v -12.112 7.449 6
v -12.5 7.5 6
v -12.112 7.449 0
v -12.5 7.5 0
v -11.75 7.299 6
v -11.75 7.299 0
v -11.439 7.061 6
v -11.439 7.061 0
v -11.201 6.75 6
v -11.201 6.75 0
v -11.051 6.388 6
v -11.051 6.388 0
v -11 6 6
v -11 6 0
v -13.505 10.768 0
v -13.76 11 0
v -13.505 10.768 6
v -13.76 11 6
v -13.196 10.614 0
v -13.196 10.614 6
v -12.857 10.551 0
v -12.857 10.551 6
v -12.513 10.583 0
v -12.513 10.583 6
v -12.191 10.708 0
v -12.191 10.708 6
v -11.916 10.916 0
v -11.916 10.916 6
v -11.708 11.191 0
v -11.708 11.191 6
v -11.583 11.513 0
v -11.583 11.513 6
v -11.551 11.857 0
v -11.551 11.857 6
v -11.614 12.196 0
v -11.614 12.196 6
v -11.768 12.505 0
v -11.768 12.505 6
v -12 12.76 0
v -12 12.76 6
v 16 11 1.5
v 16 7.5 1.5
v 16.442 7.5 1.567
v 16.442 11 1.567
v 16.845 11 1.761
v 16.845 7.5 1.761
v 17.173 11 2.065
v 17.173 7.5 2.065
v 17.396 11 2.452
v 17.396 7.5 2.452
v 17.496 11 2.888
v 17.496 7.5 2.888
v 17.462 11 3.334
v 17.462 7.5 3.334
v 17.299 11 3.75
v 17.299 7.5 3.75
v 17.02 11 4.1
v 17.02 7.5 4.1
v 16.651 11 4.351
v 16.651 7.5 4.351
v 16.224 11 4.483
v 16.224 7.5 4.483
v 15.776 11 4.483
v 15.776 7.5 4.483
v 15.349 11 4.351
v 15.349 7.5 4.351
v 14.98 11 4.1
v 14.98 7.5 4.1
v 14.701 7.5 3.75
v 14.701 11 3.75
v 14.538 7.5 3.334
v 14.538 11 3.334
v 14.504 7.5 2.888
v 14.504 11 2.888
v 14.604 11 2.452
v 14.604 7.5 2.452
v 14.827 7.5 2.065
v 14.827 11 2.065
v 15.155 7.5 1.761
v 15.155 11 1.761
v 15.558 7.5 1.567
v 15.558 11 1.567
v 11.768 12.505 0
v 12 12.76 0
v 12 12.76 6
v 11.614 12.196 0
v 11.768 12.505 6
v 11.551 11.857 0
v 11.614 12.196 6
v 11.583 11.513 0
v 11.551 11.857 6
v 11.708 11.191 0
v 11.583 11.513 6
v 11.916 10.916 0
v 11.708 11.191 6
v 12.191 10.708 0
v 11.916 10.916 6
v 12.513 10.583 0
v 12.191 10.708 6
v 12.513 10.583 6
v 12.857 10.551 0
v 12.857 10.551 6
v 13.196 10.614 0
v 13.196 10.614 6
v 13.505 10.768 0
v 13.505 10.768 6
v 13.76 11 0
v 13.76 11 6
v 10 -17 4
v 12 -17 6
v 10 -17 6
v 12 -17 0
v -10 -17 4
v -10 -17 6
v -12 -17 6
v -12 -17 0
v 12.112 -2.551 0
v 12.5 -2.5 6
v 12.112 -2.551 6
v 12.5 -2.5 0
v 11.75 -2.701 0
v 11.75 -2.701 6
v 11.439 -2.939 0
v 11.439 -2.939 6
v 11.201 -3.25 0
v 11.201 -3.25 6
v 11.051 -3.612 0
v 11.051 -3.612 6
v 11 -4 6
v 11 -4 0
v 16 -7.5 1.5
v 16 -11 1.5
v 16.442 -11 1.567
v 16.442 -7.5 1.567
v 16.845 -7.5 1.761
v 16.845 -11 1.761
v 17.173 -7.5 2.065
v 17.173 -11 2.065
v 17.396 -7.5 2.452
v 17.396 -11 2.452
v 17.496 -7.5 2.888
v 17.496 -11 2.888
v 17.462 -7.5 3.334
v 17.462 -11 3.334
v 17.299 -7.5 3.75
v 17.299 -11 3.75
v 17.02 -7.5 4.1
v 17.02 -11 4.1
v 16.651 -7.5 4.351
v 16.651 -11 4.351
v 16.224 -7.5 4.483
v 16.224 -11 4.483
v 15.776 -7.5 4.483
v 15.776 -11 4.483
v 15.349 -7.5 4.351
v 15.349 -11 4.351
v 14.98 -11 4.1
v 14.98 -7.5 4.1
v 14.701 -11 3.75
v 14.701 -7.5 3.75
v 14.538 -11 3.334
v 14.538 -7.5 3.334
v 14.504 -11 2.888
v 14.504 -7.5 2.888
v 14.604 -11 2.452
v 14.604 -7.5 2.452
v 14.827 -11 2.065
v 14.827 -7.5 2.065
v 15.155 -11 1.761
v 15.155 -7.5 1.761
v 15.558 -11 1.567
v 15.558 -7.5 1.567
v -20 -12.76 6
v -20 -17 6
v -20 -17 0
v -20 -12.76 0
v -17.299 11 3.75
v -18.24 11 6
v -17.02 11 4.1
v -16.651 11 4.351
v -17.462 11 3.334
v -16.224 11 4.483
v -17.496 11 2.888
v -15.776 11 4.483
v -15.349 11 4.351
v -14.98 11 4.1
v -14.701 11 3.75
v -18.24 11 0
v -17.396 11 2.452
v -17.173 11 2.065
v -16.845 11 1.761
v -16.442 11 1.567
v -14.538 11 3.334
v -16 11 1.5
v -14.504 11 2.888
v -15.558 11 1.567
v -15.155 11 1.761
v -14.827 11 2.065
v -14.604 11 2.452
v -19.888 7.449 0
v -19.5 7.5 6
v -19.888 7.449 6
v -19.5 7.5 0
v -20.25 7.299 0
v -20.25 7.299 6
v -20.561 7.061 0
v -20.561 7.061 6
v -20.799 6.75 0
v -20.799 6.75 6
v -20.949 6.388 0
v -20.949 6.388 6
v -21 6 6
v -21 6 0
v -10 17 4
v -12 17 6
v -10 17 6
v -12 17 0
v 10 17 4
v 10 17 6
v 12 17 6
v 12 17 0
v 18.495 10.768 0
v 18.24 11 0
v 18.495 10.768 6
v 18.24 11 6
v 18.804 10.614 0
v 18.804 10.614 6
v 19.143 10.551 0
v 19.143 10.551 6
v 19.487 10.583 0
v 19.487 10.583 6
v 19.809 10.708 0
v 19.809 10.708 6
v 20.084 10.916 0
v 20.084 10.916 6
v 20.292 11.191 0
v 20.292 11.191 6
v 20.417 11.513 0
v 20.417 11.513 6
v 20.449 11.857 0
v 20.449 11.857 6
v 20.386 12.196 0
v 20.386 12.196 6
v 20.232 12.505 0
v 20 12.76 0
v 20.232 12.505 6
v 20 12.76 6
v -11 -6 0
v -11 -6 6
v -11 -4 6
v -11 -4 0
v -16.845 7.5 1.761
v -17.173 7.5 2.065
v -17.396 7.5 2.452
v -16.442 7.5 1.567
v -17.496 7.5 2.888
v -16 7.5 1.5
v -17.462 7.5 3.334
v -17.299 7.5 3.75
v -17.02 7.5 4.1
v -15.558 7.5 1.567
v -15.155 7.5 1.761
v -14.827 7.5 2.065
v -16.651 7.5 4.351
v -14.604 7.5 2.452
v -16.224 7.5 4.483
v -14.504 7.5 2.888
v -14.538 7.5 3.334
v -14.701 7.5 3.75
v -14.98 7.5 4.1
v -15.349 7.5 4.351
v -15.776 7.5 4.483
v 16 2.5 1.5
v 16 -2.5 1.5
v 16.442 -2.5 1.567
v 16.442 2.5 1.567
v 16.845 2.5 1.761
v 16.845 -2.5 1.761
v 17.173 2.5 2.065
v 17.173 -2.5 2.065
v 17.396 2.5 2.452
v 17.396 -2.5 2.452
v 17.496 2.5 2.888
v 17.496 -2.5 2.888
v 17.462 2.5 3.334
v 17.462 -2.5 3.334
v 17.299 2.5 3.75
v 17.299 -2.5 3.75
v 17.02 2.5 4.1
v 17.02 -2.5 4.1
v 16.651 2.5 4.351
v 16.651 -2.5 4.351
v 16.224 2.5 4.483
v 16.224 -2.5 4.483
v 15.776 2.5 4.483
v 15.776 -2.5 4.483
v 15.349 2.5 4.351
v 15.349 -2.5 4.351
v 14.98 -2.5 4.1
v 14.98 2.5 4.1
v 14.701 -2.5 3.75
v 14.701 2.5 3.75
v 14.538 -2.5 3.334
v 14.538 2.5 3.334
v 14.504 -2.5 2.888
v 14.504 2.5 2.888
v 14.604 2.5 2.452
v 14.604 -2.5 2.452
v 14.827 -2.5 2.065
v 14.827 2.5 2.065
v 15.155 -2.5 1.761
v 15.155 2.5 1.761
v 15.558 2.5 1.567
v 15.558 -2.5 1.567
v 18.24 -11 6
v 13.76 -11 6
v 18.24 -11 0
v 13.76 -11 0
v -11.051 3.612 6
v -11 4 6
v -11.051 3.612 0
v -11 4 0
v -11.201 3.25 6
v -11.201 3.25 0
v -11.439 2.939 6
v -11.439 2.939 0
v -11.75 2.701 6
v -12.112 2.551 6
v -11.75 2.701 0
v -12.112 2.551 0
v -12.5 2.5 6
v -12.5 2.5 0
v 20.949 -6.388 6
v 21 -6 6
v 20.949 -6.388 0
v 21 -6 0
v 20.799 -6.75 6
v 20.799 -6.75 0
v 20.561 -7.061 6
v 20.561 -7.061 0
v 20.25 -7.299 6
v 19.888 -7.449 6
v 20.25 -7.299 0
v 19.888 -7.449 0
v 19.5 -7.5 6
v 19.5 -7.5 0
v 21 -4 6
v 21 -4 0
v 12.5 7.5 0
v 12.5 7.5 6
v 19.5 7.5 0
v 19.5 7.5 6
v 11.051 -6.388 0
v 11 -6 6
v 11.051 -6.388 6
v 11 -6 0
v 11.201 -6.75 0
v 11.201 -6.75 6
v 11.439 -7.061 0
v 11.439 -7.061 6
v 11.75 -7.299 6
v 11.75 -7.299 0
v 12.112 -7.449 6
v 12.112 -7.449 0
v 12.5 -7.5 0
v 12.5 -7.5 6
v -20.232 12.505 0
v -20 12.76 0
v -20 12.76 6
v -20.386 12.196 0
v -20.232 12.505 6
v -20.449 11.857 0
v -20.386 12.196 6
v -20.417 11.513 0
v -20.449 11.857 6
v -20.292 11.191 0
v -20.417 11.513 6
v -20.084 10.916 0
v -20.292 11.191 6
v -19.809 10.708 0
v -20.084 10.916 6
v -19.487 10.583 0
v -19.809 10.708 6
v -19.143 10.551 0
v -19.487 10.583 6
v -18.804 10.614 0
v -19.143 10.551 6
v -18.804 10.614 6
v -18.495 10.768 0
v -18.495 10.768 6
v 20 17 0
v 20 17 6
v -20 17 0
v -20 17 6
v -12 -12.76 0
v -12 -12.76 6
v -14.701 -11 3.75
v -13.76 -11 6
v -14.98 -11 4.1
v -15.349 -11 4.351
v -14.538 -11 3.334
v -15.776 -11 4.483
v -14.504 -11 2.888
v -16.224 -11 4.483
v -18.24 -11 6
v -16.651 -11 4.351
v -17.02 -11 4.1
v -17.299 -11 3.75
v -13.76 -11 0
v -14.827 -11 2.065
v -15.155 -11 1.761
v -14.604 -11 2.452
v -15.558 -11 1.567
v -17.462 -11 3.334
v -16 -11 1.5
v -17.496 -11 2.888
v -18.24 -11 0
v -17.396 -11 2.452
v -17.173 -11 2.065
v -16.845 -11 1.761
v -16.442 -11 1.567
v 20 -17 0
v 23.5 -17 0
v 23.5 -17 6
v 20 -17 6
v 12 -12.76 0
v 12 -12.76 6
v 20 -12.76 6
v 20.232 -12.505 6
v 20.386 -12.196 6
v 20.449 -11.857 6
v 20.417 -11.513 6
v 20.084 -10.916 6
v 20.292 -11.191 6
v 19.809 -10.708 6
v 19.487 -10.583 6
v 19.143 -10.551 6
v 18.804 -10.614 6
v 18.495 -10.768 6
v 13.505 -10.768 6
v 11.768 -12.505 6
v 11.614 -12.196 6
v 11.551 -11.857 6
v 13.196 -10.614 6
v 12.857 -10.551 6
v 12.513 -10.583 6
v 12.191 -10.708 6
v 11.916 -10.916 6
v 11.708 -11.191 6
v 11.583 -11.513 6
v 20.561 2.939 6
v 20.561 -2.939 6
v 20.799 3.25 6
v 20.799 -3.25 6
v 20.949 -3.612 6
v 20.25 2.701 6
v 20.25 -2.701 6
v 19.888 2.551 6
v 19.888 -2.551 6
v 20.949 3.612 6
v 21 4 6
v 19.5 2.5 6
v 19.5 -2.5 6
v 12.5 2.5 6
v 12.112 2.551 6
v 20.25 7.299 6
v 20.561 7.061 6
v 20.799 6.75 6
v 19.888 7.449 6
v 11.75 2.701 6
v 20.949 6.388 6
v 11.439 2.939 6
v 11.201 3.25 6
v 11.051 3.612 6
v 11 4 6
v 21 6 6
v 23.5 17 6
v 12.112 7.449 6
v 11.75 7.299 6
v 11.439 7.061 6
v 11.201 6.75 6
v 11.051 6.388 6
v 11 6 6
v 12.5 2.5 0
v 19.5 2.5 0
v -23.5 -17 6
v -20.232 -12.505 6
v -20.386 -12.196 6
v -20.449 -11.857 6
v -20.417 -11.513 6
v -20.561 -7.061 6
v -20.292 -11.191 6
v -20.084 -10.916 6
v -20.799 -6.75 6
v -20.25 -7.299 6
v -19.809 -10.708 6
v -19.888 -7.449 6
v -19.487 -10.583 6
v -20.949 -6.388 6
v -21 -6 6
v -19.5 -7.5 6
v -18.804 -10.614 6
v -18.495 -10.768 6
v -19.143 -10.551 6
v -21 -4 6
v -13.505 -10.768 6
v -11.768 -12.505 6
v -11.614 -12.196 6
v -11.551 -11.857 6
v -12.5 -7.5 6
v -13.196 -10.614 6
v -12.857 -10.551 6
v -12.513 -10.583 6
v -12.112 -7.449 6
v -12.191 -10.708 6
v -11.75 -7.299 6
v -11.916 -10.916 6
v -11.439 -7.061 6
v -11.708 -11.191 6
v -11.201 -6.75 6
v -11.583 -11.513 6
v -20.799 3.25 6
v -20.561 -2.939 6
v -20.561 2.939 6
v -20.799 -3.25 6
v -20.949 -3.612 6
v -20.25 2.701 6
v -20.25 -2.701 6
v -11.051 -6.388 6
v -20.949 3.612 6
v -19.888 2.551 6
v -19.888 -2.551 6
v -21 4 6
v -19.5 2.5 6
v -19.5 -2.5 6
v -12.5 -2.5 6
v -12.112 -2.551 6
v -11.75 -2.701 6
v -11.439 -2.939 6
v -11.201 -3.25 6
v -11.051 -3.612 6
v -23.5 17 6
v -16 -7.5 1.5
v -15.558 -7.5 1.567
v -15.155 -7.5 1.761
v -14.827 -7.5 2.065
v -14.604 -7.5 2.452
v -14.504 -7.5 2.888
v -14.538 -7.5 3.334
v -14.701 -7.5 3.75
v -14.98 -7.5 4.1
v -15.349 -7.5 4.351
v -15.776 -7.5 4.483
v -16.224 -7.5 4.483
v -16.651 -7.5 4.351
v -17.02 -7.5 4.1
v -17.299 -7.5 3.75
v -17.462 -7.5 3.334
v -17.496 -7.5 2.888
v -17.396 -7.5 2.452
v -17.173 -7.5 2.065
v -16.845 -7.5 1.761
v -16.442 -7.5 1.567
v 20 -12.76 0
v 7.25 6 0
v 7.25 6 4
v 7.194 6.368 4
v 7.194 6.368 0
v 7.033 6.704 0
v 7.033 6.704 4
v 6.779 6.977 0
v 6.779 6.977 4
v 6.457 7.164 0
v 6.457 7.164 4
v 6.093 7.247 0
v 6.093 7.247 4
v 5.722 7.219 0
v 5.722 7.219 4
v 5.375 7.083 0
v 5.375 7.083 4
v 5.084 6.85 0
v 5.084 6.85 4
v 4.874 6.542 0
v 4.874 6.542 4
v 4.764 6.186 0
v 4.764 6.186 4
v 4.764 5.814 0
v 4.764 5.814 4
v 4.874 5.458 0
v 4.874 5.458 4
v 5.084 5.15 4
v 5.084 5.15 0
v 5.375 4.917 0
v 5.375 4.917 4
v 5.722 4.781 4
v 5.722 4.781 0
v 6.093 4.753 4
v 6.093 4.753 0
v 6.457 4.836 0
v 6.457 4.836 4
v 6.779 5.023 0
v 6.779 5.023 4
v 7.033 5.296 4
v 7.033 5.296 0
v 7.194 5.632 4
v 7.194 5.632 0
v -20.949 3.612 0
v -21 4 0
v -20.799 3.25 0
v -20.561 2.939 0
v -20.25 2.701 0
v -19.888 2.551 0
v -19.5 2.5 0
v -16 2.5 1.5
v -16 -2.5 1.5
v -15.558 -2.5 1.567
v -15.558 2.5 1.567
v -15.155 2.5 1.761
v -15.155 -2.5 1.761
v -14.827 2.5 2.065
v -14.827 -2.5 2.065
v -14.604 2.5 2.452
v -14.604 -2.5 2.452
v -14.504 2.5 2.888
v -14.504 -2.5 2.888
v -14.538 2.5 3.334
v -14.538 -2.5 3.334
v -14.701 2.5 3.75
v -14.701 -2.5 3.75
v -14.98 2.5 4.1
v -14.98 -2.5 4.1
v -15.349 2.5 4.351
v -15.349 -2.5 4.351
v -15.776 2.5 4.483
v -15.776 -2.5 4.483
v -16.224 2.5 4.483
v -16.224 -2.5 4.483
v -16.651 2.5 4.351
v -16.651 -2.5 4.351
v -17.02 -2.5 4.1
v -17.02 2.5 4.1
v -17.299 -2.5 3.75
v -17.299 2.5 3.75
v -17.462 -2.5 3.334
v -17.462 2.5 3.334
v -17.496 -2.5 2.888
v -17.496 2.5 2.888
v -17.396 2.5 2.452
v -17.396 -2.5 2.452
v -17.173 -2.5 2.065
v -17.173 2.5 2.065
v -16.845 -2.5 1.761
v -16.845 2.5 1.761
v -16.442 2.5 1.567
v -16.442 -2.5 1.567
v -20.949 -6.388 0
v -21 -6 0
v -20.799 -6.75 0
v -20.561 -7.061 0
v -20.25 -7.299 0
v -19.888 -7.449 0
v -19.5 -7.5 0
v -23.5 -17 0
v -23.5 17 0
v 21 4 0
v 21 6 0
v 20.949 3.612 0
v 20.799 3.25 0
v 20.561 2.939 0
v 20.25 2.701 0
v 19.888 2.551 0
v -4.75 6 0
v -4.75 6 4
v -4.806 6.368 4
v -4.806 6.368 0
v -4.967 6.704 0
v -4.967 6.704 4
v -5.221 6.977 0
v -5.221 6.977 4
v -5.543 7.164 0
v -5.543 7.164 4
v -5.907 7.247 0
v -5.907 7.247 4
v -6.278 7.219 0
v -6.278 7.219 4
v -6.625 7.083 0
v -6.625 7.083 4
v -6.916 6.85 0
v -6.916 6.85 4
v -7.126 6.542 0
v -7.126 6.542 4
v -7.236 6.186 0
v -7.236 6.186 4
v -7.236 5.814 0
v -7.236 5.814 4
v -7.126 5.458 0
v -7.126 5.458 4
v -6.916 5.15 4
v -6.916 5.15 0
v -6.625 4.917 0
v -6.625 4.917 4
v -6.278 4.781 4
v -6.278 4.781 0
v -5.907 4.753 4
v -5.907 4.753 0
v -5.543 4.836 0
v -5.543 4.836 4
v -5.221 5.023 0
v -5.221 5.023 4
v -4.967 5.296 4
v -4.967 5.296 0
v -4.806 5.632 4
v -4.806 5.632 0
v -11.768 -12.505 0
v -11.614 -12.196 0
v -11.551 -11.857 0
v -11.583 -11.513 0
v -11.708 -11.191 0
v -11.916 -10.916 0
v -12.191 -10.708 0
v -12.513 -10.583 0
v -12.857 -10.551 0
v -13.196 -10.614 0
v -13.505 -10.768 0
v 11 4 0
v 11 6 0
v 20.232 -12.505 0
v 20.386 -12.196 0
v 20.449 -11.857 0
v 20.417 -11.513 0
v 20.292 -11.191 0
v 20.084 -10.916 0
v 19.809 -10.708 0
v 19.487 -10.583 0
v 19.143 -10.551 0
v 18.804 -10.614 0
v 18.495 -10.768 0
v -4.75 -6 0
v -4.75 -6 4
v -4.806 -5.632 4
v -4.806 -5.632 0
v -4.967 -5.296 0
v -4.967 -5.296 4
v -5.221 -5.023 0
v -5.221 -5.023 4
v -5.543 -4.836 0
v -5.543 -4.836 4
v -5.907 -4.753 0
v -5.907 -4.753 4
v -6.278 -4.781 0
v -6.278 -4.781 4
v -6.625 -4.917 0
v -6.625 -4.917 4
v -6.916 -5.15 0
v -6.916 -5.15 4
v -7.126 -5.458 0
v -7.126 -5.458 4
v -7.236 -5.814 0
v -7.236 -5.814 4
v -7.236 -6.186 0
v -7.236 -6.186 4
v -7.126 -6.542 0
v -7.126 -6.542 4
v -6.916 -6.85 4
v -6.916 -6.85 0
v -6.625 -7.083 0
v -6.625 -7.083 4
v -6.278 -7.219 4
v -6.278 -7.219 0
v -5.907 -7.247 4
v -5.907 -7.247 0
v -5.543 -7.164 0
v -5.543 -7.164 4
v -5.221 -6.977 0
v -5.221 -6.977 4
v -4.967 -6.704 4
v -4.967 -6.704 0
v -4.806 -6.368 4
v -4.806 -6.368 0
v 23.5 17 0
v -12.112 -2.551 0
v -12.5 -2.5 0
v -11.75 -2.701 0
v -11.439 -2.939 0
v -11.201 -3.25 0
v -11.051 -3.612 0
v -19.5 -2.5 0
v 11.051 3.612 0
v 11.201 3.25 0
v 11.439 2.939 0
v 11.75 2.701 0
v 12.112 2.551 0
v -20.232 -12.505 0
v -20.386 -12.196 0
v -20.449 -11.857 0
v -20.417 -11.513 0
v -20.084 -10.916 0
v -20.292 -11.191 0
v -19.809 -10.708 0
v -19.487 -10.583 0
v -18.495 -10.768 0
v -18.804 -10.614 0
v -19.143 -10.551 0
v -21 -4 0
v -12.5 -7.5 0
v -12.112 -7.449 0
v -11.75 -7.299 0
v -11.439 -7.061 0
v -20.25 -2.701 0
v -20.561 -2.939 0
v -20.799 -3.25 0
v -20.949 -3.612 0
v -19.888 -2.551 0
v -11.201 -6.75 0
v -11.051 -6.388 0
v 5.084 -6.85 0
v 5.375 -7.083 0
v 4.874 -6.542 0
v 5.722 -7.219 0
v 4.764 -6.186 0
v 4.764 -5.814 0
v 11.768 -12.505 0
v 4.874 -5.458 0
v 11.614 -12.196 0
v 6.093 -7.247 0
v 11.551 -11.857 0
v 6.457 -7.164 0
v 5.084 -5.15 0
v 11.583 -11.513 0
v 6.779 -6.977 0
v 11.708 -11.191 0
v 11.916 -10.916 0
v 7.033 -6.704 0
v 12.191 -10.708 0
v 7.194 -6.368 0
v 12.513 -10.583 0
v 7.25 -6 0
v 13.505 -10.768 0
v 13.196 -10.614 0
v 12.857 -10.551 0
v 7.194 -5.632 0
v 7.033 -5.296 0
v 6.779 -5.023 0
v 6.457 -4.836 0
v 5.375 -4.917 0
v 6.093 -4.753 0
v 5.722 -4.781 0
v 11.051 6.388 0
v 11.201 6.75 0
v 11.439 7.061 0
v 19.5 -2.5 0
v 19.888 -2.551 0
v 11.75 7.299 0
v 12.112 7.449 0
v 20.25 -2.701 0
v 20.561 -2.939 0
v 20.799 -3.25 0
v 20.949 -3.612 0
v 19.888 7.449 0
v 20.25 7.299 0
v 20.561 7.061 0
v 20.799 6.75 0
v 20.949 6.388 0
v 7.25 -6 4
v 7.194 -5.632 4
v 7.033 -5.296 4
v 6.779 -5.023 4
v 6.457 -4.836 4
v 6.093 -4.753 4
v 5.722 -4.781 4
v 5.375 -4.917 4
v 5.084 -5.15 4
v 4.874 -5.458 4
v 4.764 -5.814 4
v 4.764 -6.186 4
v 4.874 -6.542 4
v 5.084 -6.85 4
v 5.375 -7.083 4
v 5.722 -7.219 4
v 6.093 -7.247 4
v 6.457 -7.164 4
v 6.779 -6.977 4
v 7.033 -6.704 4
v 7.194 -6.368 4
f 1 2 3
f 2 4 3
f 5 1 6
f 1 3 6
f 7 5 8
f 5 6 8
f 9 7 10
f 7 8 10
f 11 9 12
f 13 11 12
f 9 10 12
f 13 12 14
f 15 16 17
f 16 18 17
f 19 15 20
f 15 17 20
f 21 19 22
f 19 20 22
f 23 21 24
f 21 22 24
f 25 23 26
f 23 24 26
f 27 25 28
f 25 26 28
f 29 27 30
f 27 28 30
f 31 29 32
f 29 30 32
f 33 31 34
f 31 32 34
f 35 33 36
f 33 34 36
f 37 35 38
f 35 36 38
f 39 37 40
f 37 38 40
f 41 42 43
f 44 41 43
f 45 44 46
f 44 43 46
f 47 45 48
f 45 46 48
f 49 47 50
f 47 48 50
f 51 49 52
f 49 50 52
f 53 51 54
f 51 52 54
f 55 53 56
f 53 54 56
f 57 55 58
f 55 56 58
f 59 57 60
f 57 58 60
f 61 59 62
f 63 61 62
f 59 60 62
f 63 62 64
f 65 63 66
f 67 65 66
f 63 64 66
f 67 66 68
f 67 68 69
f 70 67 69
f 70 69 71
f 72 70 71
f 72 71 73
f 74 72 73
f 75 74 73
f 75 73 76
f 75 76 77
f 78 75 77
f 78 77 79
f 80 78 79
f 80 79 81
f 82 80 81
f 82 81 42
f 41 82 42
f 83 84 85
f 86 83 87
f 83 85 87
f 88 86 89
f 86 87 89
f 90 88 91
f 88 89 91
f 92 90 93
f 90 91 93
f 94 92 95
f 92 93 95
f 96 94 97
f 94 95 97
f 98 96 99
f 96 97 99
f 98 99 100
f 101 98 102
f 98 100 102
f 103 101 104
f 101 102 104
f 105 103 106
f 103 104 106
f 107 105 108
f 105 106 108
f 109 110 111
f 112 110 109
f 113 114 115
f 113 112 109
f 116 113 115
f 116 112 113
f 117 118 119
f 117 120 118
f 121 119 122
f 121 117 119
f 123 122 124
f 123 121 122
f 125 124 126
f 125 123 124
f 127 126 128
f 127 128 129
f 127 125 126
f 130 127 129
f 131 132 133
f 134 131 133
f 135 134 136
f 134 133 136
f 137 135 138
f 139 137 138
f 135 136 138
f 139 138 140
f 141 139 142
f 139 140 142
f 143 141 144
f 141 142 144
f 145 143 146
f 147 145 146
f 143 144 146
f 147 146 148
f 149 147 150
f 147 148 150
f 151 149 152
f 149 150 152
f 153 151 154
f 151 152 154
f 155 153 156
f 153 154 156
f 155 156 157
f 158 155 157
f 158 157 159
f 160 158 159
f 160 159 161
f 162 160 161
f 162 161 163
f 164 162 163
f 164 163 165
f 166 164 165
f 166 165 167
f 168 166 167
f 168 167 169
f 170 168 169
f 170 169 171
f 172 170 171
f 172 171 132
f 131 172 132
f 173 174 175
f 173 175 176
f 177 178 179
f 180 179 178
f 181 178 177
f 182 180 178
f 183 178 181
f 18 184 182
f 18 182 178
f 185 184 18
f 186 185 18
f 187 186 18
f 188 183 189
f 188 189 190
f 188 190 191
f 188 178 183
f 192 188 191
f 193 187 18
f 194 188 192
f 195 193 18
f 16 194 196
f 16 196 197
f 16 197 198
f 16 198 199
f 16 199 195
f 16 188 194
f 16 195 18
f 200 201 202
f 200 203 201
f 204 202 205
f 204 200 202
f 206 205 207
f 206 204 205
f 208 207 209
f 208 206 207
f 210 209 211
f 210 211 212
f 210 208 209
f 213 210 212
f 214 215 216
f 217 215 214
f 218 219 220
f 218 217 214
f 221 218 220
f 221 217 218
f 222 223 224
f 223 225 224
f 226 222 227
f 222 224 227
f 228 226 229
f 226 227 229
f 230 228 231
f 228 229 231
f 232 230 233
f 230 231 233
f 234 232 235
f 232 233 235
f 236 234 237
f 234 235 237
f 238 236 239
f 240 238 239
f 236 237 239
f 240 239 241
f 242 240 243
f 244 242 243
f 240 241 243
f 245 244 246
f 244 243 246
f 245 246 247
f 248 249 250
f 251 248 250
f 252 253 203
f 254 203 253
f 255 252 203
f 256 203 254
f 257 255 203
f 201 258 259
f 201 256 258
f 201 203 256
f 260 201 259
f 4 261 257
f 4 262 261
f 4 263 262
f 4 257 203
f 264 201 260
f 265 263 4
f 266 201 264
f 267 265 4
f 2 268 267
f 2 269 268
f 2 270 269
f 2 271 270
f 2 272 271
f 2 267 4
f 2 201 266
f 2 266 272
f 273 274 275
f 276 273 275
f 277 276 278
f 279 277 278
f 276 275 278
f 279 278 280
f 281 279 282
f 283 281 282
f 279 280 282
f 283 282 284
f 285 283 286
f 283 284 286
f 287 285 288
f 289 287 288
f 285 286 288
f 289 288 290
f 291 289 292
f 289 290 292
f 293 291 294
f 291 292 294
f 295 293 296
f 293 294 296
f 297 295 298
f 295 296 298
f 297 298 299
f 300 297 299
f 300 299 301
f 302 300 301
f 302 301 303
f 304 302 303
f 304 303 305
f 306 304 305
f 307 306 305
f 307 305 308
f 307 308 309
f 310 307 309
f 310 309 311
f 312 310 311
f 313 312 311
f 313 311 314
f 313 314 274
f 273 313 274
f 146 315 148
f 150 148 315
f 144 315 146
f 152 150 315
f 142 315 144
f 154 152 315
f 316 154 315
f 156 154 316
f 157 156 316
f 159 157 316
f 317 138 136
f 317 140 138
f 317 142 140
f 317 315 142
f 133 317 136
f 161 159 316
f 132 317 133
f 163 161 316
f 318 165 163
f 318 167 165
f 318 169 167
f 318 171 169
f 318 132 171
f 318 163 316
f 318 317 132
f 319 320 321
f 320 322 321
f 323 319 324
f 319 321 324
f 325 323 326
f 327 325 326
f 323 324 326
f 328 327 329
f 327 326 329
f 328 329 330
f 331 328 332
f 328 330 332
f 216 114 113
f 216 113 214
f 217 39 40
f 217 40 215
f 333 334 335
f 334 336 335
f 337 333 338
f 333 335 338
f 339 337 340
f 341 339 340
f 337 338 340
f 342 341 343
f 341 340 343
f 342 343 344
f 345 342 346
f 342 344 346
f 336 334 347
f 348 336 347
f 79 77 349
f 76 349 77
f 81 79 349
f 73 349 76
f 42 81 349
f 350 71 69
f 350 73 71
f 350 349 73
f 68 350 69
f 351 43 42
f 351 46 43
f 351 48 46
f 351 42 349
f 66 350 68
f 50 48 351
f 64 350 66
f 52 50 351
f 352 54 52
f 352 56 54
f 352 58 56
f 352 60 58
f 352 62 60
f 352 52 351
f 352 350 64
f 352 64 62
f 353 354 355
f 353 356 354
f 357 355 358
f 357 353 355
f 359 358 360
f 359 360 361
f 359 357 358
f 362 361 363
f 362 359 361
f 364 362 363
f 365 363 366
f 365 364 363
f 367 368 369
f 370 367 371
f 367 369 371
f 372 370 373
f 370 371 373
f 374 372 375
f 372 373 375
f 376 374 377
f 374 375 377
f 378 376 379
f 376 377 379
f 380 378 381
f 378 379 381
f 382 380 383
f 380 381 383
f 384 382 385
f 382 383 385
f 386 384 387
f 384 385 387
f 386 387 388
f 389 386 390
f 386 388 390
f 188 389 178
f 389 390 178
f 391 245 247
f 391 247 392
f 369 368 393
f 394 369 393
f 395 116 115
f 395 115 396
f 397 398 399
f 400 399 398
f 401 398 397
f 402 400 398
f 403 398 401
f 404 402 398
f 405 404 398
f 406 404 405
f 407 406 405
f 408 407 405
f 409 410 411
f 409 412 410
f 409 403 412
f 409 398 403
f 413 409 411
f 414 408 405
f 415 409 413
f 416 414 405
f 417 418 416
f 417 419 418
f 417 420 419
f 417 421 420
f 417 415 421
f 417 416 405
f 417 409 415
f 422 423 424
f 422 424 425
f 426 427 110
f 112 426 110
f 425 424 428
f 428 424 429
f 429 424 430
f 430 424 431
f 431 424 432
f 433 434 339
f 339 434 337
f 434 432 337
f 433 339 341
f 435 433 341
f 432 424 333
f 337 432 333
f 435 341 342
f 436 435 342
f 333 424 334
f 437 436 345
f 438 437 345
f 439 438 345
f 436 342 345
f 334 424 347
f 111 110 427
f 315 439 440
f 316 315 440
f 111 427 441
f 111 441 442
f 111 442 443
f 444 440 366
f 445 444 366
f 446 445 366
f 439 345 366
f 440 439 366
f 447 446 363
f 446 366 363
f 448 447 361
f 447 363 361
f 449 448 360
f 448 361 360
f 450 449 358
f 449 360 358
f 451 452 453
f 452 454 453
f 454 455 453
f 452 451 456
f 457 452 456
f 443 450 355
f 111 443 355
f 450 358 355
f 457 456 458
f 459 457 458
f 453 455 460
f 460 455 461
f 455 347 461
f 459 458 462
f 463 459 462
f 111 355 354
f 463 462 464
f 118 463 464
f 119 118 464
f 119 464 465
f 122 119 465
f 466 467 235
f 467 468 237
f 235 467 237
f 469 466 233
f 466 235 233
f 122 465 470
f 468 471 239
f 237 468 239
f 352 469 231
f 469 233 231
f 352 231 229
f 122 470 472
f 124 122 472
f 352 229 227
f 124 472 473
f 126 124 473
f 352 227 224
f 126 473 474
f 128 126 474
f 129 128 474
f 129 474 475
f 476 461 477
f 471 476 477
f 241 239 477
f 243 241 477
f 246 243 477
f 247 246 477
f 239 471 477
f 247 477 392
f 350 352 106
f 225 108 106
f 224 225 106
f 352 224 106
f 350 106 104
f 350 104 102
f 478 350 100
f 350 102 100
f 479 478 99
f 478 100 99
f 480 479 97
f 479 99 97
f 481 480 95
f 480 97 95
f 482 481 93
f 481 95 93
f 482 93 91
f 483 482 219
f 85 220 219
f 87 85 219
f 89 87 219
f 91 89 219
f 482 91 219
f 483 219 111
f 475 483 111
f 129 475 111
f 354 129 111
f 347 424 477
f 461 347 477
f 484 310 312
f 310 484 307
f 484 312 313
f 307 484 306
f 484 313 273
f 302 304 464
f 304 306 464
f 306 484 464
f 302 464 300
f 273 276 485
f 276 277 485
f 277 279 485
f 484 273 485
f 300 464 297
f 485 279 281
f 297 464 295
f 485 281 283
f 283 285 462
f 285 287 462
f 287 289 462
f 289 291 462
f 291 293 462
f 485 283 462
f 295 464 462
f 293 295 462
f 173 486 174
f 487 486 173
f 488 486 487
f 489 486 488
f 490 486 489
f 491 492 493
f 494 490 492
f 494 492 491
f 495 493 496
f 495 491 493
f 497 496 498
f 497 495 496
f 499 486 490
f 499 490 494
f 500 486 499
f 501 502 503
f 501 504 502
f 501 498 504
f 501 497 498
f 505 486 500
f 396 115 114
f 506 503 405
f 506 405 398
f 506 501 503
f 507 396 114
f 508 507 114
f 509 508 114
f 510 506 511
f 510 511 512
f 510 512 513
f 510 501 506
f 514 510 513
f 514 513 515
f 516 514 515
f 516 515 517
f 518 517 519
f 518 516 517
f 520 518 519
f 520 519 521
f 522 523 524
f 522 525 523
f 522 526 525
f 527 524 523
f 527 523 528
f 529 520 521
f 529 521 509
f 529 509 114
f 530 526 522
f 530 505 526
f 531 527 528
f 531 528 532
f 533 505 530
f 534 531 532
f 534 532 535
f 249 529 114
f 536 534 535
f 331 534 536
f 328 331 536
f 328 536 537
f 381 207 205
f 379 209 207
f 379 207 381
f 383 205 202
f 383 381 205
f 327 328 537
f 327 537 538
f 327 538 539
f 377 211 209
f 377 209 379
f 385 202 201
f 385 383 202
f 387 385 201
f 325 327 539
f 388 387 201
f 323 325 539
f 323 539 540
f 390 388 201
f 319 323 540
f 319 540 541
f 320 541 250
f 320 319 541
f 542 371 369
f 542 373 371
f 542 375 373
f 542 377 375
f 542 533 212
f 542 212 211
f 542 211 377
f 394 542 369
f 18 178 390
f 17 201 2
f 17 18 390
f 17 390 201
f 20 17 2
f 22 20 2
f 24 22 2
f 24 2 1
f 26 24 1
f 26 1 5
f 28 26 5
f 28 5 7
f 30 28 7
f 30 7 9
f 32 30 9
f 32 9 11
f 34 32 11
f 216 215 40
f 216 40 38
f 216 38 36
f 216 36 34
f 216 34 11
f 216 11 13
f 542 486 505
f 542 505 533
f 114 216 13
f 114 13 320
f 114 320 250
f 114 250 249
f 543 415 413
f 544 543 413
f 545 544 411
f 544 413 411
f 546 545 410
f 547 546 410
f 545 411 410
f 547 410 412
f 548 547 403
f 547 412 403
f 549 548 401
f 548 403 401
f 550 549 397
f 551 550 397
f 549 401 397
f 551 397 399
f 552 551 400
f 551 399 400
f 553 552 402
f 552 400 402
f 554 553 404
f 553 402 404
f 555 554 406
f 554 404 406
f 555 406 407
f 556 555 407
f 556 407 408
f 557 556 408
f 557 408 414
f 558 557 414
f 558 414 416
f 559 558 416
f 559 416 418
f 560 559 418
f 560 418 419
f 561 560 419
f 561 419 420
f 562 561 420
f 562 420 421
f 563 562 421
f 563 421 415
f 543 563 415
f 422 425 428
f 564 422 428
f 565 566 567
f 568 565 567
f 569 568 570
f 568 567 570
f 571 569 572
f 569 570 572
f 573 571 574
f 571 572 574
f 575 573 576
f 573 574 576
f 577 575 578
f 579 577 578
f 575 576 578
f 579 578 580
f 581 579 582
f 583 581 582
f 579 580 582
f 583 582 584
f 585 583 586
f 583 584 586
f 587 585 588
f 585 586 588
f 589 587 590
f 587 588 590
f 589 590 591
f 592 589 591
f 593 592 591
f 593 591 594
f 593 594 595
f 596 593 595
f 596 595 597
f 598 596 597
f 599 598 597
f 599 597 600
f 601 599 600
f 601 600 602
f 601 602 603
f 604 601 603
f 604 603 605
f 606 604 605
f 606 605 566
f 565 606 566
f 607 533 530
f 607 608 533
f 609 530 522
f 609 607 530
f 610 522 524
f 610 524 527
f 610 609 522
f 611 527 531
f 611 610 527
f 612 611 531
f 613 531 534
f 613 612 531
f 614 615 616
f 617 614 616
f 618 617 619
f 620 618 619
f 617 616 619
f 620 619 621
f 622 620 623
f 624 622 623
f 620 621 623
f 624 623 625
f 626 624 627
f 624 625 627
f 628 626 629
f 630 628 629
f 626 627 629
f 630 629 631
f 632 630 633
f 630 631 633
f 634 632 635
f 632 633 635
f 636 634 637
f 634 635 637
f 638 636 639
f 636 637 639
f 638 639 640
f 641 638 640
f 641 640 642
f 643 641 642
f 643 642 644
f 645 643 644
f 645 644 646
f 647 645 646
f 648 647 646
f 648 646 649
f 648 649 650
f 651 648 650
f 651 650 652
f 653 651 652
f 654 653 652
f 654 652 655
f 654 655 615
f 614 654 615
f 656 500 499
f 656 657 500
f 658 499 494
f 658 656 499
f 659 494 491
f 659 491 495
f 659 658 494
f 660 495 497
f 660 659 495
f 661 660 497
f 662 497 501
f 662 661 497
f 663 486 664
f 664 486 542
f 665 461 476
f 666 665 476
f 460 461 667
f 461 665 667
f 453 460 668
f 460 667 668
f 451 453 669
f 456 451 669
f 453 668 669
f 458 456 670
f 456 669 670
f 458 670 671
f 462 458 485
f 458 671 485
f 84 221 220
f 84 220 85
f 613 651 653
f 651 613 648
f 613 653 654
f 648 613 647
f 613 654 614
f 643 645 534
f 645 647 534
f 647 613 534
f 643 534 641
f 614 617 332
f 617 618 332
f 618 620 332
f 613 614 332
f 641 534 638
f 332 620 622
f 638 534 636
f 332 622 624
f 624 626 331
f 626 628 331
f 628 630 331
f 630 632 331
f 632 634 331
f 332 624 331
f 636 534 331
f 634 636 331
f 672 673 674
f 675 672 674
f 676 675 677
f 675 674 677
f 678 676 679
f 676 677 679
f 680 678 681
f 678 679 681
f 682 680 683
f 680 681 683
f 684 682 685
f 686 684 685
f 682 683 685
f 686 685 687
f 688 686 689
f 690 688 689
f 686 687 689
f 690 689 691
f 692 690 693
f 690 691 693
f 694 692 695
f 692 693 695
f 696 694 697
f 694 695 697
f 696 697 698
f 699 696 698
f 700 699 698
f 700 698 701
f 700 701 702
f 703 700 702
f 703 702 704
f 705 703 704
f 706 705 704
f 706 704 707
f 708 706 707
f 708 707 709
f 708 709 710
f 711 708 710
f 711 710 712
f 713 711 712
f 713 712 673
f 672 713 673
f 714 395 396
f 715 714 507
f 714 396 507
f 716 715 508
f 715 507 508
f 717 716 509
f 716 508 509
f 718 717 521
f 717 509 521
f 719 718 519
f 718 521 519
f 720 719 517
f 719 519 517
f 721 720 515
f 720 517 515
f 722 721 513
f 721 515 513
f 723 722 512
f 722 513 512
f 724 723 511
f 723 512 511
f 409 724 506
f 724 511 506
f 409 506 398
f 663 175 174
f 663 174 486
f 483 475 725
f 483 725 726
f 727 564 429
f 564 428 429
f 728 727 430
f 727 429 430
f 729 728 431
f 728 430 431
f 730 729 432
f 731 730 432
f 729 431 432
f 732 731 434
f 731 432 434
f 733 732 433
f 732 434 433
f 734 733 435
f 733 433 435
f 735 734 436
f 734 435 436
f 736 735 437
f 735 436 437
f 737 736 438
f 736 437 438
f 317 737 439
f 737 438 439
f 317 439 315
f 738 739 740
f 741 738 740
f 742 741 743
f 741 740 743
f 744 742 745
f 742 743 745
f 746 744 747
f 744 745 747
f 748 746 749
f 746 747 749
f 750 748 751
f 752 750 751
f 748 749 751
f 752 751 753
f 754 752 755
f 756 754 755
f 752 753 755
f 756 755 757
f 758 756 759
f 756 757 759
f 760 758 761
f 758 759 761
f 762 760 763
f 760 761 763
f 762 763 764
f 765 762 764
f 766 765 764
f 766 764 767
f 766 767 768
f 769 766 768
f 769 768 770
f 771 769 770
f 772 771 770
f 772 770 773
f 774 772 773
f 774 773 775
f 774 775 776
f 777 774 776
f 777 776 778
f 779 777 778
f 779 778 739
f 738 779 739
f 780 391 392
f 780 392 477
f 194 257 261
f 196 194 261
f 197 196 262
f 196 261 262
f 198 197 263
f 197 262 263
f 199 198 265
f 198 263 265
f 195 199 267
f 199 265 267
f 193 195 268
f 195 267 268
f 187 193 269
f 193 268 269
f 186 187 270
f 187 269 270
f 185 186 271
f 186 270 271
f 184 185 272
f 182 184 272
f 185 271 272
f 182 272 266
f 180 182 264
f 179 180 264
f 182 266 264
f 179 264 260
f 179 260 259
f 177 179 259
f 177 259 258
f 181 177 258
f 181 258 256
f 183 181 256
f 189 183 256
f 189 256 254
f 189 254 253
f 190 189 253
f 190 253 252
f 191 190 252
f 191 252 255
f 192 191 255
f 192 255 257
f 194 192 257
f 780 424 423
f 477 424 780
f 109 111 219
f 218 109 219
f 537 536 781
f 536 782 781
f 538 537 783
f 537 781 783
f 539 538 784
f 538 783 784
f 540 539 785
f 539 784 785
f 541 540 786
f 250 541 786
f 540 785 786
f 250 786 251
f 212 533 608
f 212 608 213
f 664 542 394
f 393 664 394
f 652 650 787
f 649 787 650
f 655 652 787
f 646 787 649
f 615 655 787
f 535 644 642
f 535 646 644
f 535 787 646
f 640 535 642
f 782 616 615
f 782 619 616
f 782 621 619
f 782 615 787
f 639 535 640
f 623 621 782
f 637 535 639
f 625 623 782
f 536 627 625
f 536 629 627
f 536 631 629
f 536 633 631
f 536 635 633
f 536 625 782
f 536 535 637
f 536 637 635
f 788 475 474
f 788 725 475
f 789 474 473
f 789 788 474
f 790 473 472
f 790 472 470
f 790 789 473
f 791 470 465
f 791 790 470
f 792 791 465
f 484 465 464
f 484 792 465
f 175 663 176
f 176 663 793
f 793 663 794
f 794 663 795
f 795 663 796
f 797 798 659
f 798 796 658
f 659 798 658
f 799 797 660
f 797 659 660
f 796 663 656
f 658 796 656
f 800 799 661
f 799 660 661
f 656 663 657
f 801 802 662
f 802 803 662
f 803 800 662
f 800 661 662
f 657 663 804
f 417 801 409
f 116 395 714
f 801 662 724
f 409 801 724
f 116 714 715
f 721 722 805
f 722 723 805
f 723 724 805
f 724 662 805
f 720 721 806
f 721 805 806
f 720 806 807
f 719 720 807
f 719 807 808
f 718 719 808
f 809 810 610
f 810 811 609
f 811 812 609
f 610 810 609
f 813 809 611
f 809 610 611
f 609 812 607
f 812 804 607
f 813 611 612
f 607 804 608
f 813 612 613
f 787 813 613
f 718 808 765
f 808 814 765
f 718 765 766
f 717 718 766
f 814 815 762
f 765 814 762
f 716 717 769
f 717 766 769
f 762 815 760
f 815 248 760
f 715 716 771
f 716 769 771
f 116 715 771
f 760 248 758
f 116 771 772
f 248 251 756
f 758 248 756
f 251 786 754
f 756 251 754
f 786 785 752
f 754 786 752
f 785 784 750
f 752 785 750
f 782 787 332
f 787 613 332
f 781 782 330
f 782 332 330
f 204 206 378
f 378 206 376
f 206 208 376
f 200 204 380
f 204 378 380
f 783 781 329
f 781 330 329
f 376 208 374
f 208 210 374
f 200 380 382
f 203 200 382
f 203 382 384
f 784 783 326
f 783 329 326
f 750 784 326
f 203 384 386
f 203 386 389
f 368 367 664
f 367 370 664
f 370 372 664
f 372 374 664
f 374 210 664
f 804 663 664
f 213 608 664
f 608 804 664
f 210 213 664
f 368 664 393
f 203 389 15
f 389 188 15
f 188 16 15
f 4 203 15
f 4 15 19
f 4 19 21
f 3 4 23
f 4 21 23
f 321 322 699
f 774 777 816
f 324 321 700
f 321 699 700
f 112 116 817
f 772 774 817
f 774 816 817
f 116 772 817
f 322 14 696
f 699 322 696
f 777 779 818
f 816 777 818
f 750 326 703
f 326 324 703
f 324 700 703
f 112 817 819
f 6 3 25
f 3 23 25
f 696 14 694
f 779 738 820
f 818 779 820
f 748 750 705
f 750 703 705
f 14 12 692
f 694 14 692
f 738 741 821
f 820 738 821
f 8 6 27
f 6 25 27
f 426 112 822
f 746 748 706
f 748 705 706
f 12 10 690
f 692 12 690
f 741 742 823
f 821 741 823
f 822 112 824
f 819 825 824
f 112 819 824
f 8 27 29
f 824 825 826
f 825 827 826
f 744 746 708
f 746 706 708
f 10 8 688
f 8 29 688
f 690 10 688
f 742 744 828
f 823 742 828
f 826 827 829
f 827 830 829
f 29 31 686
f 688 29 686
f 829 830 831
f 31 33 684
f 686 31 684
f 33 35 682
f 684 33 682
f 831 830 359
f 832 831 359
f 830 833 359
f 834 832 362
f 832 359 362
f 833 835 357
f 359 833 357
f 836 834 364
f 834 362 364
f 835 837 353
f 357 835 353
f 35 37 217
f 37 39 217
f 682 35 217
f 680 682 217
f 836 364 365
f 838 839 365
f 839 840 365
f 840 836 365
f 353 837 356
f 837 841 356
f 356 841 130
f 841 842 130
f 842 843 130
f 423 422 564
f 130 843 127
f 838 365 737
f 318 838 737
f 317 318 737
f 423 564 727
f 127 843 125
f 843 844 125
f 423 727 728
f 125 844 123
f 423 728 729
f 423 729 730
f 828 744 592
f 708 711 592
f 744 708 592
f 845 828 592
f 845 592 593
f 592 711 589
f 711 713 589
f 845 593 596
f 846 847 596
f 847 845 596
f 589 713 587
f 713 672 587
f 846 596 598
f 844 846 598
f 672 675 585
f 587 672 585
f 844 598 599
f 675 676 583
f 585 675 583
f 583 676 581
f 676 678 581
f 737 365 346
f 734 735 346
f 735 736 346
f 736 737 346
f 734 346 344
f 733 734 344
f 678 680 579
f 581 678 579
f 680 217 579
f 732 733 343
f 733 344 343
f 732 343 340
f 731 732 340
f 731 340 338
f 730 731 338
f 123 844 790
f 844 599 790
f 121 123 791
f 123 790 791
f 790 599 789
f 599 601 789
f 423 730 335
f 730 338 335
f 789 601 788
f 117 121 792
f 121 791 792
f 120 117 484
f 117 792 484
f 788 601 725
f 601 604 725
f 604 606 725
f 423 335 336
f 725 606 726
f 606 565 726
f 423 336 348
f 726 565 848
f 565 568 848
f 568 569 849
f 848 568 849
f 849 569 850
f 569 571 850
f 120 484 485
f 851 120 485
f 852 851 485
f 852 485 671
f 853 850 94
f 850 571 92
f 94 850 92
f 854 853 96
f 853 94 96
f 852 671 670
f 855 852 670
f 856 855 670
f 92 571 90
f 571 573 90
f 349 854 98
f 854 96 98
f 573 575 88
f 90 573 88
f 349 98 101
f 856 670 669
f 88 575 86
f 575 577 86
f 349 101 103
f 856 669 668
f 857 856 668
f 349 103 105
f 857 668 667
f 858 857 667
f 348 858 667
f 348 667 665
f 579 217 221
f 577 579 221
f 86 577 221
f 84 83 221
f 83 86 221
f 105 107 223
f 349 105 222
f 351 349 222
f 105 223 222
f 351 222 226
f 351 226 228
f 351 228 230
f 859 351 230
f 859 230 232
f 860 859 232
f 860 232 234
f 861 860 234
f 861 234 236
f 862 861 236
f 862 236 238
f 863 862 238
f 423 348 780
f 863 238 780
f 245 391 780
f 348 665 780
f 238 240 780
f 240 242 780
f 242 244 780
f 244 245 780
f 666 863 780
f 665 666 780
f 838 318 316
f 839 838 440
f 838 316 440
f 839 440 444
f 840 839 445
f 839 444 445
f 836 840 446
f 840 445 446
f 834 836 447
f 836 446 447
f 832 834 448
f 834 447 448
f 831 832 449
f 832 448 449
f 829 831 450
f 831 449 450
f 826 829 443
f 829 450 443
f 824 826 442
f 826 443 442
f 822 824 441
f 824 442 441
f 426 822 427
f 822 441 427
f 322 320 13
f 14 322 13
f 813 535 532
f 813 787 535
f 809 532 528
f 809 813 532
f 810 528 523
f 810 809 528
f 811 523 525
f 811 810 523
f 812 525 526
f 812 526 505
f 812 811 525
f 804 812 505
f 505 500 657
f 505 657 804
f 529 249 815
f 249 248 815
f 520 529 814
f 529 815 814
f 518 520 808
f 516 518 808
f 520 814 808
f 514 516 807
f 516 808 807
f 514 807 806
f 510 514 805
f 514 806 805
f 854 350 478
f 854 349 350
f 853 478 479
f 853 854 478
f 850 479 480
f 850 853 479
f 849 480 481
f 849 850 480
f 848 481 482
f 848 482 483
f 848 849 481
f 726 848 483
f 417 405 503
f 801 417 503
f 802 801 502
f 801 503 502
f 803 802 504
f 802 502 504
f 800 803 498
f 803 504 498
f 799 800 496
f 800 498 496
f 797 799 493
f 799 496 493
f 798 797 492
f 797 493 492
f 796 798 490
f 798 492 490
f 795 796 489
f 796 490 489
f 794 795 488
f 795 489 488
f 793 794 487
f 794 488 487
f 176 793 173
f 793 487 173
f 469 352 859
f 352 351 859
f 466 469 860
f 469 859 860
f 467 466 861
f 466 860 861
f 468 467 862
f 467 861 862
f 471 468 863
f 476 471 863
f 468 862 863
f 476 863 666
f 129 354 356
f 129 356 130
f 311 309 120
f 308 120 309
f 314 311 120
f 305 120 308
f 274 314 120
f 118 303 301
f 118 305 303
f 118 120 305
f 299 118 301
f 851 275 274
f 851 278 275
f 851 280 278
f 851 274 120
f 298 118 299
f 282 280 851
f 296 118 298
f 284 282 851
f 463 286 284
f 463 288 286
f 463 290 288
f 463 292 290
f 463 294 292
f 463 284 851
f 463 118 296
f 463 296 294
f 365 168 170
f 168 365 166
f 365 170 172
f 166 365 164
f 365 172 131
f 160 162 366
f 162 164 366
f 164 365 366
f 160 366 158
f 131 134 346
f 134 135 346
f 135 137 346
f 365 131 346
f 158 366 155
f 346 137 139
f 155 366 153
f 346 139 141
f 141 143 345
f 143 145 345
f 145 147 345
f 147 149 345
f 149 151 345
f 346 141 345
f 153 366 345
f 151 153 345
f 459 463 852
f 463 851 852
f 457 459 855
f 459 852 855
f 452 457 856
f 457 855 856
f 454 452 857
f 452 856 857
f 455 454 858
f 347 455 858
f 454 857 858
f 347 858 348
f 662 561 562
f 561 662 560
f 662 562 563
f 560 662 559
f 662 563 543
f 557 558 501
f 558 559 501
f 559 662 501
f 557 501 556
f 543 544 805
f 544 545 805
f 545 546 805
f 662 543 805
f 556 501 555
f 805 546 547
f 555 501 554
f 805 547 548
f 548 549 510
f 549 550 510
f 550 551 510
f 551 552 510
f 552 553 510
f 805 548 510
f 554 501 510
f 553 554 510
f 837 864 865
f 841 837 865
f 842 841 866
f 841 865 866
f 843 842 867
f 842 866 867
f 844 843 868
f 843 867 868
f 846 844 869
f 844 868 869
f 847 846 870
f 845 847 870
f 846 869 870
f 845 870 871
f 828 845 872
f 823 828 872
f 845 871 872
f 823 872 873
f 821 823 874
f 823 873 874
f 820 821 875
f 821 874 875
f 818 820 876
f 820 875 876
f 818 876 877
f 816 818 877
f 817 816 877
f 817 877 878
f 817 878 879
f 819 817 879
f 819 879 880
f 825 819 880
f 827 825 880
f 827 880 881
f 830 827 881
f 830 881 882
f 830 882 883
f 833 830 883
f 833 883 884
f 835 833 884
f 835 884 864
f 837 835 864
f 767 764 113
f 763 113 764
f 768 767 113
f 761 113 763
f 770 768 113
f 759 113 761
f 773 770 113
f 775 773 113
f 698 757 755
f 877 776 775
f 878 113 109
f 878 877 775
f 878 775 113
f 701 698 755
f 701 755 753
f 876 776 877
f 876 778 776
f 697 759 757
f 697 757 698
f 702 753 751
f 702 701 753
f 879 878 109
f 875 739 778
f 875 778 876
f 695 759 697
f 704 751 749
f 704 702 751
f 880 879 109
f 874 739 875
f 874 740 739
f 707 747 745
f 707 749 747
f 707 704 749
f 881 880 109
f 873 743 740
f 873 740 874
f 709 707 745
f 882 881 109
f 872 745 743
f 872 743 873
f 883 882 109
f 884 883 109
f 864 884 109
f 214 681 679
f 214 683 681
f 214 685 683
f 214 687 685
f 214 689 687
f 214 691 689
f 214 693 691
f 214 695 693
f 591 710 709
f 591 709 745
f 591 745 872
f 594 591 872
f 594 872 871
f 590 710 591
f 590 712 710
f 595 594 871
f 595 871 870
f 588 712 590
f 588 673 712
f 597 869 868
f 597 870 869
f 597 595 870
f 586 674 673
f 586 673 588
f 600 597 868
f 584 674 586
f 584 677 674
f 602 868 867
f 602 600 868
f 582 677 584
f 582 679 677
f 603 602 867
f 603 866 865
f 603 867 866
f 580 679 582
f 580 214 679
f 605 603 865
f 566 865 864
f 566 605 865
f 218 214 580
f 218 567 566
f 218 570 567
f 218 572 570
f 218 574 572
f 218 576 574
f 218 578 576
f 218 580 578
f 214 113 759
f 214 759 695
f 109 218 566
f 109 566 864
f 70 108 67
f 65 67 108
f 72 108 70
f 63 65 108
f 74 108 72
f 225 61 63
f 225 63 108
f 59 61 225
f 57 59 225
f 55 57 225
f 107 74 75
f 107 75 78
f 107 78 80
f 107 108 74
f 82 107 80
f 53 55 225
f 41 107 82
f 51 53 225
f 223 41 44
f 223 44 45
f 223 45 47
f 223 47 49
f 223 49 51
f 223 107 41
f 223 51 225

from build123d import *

# Parameters (mm, degrees)
EXTRUDE_1_DEPTH      = 6
SKETCH_2_W           = 10
SKETCH_2_H           = 5
CUT_EXTRUDE_1_DEPTH  = 31.822070015
SKETCH_3_R           = 1.5
CUT_EXTRUDE_2_DEPTH  = 39.013155617
SKETCH_4_W           = 20
SKETCH_4_H           = 34
CUT_EXTRUDE_3_DEPTH  = 2
SKETCH_5_R           = 1.25
CUT_EXTRUDE_4_DEPTH  = 31.495901364
FILLET_2_R           = 1.5
SKETCH_9_W           = 1.5
SKETCH_9_H           = 35
CUT_EXTRUDE_10_DEPTH = 31.822070015
SKETCH_10_W          = 2
SKETCH_10_H          = 6
EXTRUDE_2_DEPTH      = 6
SKETCH_11_R          = 1.25
CUT_EXTRUDE_11_DEPTH = 30.618406439


with BuildPart() as part:
    # 草图1 → 凸台-拉伸1 (new body)
    with BuildSketch(Plane.XY):
        Polygon((-25, -17), (-25, 17), (-22, 17), (-22, 11), (-12, 11), (-12, 17), (12, 17), (12, 11), (22, 11), (22, 17), (25, 17), (25, -17), (22, -17), (22, -11), (12, -11), (12, -17), (-12, -17), (-12, -11), (-22, -11), (-22, -17), align=None)
    extrude(amount=EXTRUDE_1_DEPTH)

    # 草图2 → 切除-拉伸1 (cut, through all)
    with BuildSketch(Plane.XY.offset(6)):
        with Locations((-16, 5)):
            Rectangle(SKETCH_2_W, SKETCH_2_H)
        with Locations((-16, -5)):
            Rectangle(SKETCH_2_W, SKETCH_2_H)
        with Locations((16, -5)):
            Rectangle(SKETCH_2_W, SKETCH_2_H)
        with Locations((16, 5)):
            Rectangle(SKETCH_2_W, SKETCH_2_H)
    extrude(amount=-CUT_EXTRUDE_1_DEPTH, mode=Mode.SUBTRACT)

    # 草图3 → 切除-拉伸2 (cut, through all)
    with BuildSketch(Plane.XZ.offset(11)):
        with Locations(Location((-16, 3, 0), (0, 0, 270))):
            Circle(SKETCH_3_R)
        with Locations(Location((16, 3, 0), (0, 0, 270))):
            Circle(SKETCH_3_R)
    extrude(amount=-CUT_EXTRUDE_2_DEPTH, mode=Mode.SUBTRACT)

    # 草图4 → 切除-拉伸3 (cut)
    with BuildSketch(Plane.XY.offset(6)):
        Rectangle(SKETCH_4_W, SKETCH_4_H)
    extrude(amount=-CUT_EXTRUDE_3_DEPTH, mode=Mode.SUBTRACT)

    # 草图5 → 切除-拉伸4 (cut, through all)
    with BuildSketch(Plane.XY.offset(4)):
        with Locations((-6, 6)):
            Circle(SKETCH_5_R)
        with Locations((6, 6)):
            Circle(SKETCH_5_R)
        with Locations((-6, -6)):
            Circle(SKETCH_5_R)
        with Locations((6, -6)):
            Circle(SKETCH_5_R)
    extrude(amount=-CUT_EXTRUDE_4_DEPTH, mode=Mode.SUBTRACT)

    # 圆角2
    fillet_2_edges = [part.edges().sort_by_distance(p)[0] for p in [
        (-11, 7.5, 3),
        (-11, 2.5, 3),
        (-21, 2.5, 3),
        (-21, 7.5, 3),
        (-21, -7.5, 3),
        (-21, -2.5, 3),
        (-11, -2.5, 3),
        (-11, -7.5, 3),
        (21, -2.5, 3),
        (21, -7.5, 3),
        (11, -7.5, 3),
        (11, -2.5, 3),
        (21, 7.5, 3),
        (21, 2.5, 3),
        (11, 2.5, 3),
        (11, 7.5, 3),
    ]]
    fillet(fillet_2_edges, radius=FILLET_2_R)

    # 草图9 → 切除-拉伸10 (cut, through all)
    with BuildSketch(Plane.XY.offset(6)):
        with Locations((-24.25, -0.5)):
            Rectangle(SKETCH_9_W, SKETCH_9_H)
        with Locations((24.25, -0.5)):
            Rectangle(SKETCH_9_W, SKETCH_9_H)
    extrude(amount=-CUT_EXTRUDE_10_DEPTH, mode=Mode.SUBTRACT)

    # 草图10 → 凸台-拉伸2 (add)
    with BuildSketch(Plane.XY.offset(6)):
        with Locations((-21, 14)):
            Rectangle(SKETCH_10_W, SKETCH_10_H)
        with Locations((21, 14)):
            Rectangle(SKETCH_10_W, SKETCH_10_H)
        with Locations((21, -14)):
            Rectangle(SKETCH_10_W, SKETCH_10_H)
        with Locations((-21, -14)):
            Rectangle(SKETCH_10_W, SKETCH_10_H)
    extrude(amount=-EXTRUDE_2_DEPTH)

    # 草图11 → 切除-拉伸11 (cut, through all)
    with BuildSketch(Plane.XY.offset(6)):
        with Locations((-19.2, 11.8)):
            Circle(SKETCH_11_R)
        with Locations((-12.8, 11.8)):
            Circle(SKETCH_11_R)
        with Locations((12.8, 11.8)):
            Circle(SKETCH_11_R)
        with Locations((19.2, 11.8)):
            Circle(SKETCH_11_R)
        with Locations((19.2, -11.8)):
            Circle(SKETCH_11_R)
        with Locations((12.8, -11.8)):
            Circle(SKETCH_11_R)
        with Locations((-12.8, -11.8)):
            Circle(SKETCH_11_R)
        with Locations((-19.2, -11.8)):
            Circle(SKETCH_11_R)
    extrude(amount=-CUT_EXTRUDE_11_DEPTH, mode=Mode.SUBTRACT)


solid = part.part
